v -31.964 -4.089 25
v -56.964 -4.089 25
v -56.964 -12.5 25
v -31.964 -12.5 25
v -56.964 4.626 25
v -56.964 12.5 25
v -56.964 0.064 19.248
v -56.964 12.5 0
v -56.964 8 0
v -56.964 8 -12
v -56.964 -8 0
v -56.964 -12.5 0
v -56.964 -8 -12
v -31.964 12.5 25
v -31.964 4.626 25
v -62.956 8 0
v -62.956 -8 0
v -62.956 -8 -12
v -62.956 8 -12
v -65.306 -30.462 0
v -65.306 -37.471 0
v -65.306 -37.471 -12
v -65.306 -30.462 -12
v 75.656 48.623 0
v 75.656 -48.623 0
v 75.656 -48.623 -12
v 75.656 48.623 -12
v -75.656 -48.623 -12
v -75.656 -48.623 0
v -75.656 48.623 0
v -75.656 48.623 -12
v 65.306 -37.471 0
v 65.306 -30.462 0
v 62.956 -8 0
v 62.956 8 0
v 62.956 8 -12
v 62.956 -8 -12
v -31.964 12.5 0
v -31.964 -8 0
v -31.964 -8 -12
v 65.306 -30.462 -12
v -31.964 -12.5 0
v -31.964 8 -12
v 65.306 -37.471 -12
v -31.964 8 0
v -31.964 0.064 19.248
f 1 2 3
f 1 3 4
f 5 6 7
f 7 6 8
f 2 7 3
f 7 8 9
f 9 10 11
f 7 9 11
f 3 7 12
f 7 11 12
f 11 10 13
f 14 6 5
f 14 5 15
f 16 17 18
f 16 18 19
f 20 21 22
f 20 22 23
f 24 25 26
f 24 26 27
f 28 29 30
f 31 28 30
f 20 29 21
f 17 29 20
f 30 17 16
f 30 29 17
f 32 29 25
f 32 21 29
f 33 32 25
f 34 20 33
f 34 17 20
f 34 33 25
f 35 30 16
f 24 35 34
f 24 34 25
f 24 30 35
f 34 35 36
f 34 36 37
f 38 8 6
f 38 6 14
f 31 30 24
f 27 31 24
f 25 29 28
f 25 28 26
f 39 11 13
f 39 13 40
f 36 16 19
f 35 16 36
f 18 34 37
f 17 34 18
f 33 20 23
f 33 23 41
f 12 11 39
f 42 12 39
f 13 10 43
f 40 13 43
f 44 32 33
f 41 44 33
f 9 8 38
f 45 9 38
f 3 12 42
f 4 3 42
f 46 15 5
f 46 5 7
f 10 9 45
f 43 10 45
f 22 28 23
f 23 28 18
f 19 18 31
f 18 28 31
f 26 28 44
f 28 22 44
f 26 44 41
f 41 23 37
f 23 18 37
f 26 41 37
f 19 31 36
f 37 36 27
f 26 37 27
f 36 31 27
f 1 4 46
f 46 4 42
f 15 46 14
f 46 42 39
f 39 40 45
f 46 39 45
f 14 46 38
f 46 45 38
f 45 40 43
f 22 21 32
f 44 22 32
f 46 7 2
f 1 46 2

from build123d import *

# Parameters (mm, degrees)
F0_W     = 151.3114133903
F0_H     = 97.2457080337
F0_W_2   = 130.6122839451
F0_H_2   = 7.0094466209
F0_W_3   = 25
F0_H_3   = 4
F0_H_4   = 0.5
F1_DEPTH = 12
F0_H_5   = 16
F2_DEPTH = 25
F3_DEPTH = 12
F5_DEPTH = 25


with BuildPart() as f1:
    # F0 (on Top) → F1 (new body)
    with BuildSketch(Plane.XY):
        Rectangle(F0_W, F0_H)
        with Locations((0, -33.9665152133)):
            Rectangle(F0_W_2, F0_H_2, mode=Mode.SUBTRACT)
        Polygon((-66.2499921114, 12), (-56.9642793678, 12), (-56.9642793678, 12.5), (-31.9642793678, 12.5), (-31.9642793678, 12), (66.2499921114, 12), (66.2499921114, -12), (-31.9642793678, -12), (-31.9642793678, -12.5), (-56.9642793678, -12.5), (-56.9642793678, -12), (-66.2499921114, -12), align=None, mode=Mode.SUBTRACT)
        with Locations((-44.4642793678, 10)):
            Rectangle(F0_W_3, F0_H_3)
        Polygon((-62.9557022443, -8), (-62.9557022443, 8), (-56.9642793678, 8), (-56.9642793678, 12), (-66.2499921114, 12), (-66.2499921114, -12), (-56.9642793678, -12), (-56.9642793678, -8), align=None)
        with Locations((-44.4642793678, 12.25)):
            Rectangle(F0_W_3, F0_H_4)
        with Locations((-44.4642793678, -10)):
            Rectangle(F0_W_3, F0_H_3)
        with Locations((-44.4642793678, -12.25)):
            Rectangle(F0_W_3, F0_H_4)
        Polygon((-31.9642793678, 12), (-31.9642793678, 8), (62.9557022443, 8), (62.9557022443, -8), (-31.9642793678, -8), (-31.9642793678, -12), (66.2499921114, -12), (66.2499921114, 12), align=None)
    extrude(amount=-F1_DEPTH)


with BuildPart() as f2:
    # F0 (on Top) → F2 (new body)
    with BuildSketch(Plane.XY):
        with Locations((-44.4642793678, -12.25)):
            Rectangle(F0_W_3, F0_H_4)
        with Locations((-44.4642793678, -10)):
            Rectangle(F0_W_3, F0_H_3)
        with Locations((-44.4642793678, 0)):
            Rectangle(F0_W_3, F0_H_5)
        with Locations((-44.4642793678, 10)):
            Rectangle(F0_W_3, F0_H_3)
        with Locations((-44.4642793678, 12.25)):
            Rectangle(F0_W_3, F0_H_4)
    extrude(amount=F2_DEPTH)

    # F0 (on Top) → F3 (join, through all)
    with BuildSketch(Plane.XY):
        with Locations((-44.4642793678, 0)):
            Rectangle(F0_W_3, F0_H_5)
    extrude(amount=-F3_DEPTH)

    # F4 (on face) → F5 (cut)
    with BuildSketch(Plane(origin=(-56.9642793678, 0, 0), x_dir=(0, -1, 0), z_dir=(-1, 0, 0))):
        Polygon((4.0890707848, 25), (-4.6258270741, 25), (-0.0637064282, 19.2482927877), align=None)
    extrude(amount=-F5_DEPTH, mode=Mode.SUBTRACT)


solid = Compound([f1.part, f2.part])
